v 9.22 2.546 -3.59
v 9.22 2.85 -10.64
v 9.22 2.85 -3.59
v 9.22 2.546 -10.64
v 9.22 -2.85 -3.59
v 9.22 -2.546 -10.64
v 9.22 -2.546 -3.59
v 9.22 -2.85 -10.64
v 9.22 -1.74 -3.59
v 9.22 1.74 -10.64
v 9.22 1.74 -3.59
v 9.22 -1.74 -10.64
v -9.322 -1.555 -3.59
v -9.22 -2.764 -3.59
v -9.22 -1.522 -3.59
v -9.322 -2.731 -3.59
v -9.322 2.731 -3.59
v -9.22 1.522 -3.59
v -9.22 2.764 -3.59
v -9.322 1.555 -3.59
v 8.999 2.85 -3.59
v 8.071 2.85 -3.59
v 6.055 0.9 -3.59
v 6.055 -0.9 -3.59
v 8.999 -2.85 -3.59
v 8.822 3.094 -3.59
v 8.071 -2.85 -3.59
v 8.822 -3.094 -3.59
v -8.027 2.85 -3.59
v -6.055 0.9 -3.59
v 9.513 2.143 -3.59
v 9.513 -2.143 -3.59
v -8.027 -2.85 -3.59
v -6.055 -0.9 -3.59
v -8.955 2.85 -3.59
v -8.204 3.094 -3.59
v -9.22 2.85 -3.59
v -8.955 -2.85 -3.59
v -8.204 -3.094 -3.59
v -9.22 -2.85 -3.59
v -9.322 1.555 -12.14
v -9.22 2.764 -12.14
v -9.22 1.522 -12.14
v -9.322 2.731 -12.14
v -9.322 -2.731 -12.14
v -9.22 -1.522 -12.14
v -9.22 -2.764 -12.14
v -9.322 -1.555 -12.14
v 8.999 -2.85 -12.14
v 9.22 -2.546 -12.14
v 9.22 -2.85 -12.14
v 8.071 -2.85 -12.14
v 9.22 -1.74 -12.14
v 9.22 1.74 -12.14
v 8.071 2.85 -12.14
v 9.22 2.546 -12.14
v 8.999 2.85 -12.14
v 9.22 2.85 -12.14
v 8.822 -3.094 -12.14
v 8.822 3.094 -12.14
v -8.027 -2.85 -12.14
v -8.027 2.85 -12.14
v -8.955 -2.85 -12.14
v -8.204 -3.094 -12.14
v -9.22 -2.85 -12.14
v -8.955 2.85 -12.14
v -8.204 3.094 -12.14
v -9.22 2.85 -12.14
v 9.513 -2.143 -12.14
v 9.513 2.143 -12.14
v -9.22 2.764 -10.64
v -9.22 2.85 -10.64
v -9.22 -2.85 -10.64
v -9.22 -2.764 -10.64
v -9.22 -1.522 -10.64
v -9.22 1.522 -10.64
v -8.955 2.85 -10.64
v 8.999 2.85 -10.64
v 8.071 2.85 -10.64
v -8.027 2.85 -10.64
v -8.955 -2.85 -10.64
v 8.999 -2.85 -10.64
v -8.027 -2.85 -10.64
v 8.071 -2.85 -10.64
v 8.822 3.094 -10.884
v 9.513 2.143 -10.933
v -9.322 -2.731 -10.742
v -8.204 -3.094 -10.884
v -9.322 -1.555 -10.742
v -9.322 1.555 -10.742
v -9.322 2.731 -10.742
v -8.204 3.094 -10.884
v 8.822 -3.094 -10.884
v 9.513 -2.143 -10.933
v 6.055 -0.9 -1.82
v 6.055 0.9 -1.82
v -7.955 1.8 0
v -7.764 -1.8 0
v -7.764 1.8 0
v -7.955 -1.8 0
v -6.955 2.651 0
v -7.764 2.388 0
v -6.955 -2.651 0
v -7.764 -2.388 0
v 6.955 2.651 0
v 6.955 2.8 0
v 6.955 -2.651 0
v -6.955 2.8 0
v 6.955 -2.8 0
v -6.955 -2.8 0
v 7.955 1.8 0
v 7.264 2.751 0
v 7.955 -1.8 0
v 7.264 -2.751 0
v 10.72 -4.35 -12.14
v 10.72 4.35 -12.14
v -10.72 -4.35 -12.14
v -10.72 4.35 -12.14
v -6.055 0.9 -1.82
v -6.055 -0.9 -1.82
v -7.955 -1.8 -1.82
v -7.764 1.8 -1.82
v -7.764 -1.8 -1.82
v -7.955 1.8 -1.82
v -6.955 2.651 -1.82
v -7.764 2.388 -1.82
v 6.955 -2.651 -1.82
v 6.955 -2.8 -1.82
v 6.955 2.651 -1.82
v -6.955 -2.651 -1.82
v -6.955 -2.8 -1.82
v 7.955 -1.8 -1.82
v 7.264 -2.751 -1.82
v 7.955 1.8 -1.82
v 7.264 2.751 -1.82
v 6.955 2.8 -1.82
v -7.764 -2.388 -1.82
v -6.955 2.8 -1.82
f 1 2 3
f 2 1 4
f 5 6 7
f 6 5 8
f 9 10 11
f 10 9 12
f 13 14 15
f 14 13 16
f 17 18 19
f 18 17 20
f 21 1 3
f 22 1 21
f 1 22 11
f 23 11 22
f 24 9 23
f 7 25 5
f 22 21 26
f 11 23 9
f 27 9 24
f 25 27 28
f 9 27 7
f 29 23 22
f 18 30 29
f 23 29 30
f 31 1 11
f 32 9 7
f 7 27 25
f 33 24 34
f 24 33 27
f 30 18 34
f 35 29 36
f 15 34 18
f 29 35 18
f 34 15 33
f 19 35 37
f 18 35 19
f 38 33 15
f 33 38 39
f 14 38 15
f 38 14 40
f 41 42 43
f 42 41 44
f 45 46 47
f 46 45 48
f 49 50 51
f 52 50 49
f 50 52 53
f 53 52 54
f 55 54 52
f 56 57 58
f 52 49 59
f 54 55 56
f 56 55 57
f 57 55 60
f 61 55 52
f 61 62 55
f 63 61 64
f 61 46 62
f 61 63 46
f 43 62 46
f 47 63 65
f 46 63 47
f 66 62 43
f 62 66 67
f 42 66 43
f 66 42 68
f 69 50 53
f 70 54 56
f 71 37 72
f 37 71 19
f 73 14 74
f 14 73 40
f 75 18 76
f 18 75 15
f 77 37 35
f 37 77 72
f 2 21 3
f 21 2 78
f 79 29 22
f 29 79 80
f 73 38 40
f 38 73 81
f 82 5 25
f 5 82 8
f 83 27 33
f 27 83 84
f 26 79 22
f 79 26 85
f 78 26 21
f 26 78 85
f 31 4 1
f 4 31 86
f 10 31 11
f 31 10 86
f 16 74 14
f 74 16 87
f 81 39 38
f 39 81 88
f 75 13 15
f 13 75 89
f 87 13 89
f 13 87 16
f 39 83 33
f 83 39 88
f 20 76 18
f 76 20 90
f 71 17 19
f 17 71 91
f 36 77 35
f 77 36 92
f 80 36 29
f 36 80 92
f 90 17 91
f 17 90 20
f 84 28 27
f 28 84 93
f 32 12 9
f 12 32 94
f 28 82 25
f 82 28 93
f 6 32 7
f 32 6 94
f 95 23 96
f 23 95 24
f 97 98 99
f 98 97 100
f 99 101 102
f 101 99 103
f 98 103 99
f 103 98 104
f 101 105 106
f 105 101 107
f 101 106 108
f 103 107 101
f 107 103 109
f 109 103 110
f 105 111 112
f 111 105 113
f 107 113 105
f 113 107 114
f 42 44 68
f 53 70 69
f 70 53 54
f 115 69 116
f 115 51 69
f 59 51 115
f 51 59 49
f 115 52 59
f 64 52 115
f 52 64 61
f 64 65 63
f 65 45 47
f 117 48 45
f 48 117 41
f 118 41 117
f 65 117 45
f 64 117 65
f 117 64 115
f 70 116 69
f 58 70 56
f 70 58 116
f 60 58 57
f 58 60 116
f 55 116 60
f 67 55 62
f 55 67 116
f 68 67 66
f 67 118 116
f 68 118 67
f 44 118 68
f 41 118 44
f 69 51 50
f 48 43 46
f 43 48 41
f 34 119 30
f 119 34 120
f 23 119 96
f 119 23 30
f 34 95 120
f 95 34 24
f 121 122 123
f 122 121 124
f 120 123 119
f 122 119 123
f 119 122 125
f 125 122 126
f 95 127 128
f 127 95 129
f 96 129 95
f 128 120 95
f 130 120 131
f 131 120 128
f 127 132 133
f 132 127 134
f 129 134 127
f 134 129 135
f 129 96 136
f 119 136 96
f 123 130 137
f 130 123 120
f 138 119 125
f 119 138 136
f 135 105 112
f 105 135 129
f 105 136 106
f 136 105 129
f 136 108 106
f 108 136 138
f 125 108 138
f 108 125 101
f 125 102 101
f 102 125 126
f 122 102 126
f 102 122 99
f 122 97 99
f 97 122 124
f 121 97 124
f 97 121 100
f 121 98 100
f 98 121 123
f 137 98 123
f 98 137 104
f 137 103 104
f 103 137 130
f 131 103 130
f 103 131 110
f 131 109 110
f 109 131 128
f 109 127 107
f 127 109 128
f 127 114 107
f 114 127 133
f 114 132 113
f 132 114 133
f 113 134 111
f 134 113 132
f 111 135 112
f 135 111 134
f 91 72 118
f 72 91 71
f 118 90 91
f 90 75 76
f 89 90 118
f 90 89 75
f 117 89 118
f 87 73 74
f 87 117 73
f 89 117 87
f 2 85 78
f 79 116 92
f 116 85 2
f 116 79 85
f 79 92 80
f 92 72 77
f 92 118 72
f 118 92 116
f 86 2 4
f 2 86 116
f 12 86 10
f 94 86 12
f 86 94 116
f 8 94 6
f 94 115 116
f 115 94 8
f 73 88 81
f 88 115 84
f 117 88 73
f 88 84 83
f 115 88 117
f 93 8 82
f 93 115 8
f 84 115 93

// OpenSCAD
//$fn = 20;

// produces a shape to be subtracted from a plate for the PCB card-edge passthrough
// t = plate thickness
// location = [x,y,z] top-center of 
// con_clearance = clearance between mated connector and pocket on all sides
// con_len = length of connector (samtec MECF-08-01-L-DV-NP-WT=18.34, 20pos = 33.58)
// r = tool radius
// gp_buffer = glue pocket buffer space around PCB
// pcb_t = PCB tab thickness
// pcb_len = PCB tab length
// pcb_clearance = clearance around PCB in its slot
// length for allignment fillets
module card_edge_passthrough(location, con_len=18.34, con_clearance=0.05, t=12.14, r=1, gp_buffer=2, pcb_t=1.6, pcb_len=11.91, pcb_clearance=0.1, fillet_length=1.5){
    connector_height=8.5; //mm SAMTEC MECF-XX-01-L-DV-NP-WT
    connector_width=5.60; //mm SAMTEC MECF-XX-01-L-DV-NP-WT
    
    // calculate connector pocket corner coordinates
    con_cornerA = [con_len/2+con_clearance, connector_width/2+con_clearance];
    con_cornerB = [-con_len/2-con_clearance, -connector_width/2-con_clearance];
    con_cornerC = [-con_len/2-con_clearance, connector_width/2+con_clearance];
    con_cornerD = [con_len/2+con_clearance, -connector_width/2-con_clearance];
    
    // calculate connector pocket fillet polyhedron coordinates

    fillet_corner0 = [con_cornerB[0] - fillet_length, con_cornerB[1] - fillet_length, -t];
    fillet_corner1 = [con_cornerC[0] - fillet_length, con_cornerC[1] + fillet_length, -t];
    fillet_corner2 = [con_cornerA[0] + fillet_length, con_cornerA[1] + fillet_length, -t];
    fillet_corner3 = [con_cornerD[0] + fillet_length, con_cornerD[1] - fillet_length, -t];
    fillet_corner4 = [con_cornerB[0], con_cornerB[1], -t + fillet_length];
    fillet_corner5 = [con_cornerC[0], con_cornerC[1], -t + fillet_length];
    fillet_corner6 = [con_cornerA[0], con_cornerA[1], -t + fillet_length];
    fillet_corner7 = [con_cornerD[0], con_cornerD[1], -t + fillet_length];
    
    // calculate some glue pocket parameters
    above_connector = t-connector_height; // space above the connector pocket
    gp_width = 2*gp_buffer + pcb_t; // width of glue pocket
    gp_len = 2*gp_buffer + pcb_len; // length of glue pocket
    glue_pocket_depth = above_connector/2; // depth of glue pocket
    
    union(){
        // fabricate the board slot
        translate([0,0,-t/2]) cube([pcb_len+2*pcb_clearance, pcb_t+2*pcb_clearance,t], center=true);
        
        // fabricate the rounded corner glue pocket
        translate([0,0,-glue_pocket_depth]) linear_extrude(glue_pocket_depth) difference(){// subtract away the corners to get rounds
        square([gp_len,gp_width],center=true);
        translate([gp_len/2-r,gp_width/2-r,0]) difference(){
            translate([0,0,0]) square([r,r]);
            circle(r=r);
            }
        translate([-gp_len/2+r,-gp_width/2+r,0]) difference(){
            translate([-r,-r,0]) square([r,r]);
            circle(r=r);
            }
        translate([-gp_len/2+r,gp_width/2-r,0]) difference(){
            translate([-r,0,0]) square([r,r]);
            circle(r=r);
            }
        translate([gp_len/2-r,-gp_width/2+r,0]) difference(){
            translate([0,-r,0]) square([r,r]);
            circle(r=r);
            }
        } // end difference
        
        // fabricate connector socket well with drilled corners
        translate([location[0],location[1],location[2]+(connector_height+con_clearance)/2-t]) union(){ // socket well with drilled corners
            cube([con_len+2*con_clearance,connector_width+2*con_clearance,connector_height+con_clearance],center=true);
            translate([con_cornerA[0]-r/sqrt(2),con_cornerA[1]-r/sqrt(2)]) cylinder(r=r,h=connector_height+con_clearance,center=true);
            translate([con_cornerB[0]+r/sqrt(2),con_cornerB[1]+r/sqrt(2)]) cylinder(r=r,h=connector_height+con_clearance,center=true);
            translate([con_cornerC[0]+r/sqrt(2),con_cornerC[1]-r/sqrt(2)]) cylinder(r=r,h=connector_height+con_clearance,center=true);
            translate([con_cornerD[0]-r/sqrt(2),con_cornerD[1]+r/sqrt(2)]) cylinder(r=r,h=connector_height+con_clearance,center=true);
        } // end socket well union
        
        // fabricate the fillet polyhedron
//        polyhedron(
//  points=[ fillet_corner0, fillet_corner1, fillet_corner2, fillet_corner3, // the four points at base
//           fillet_corner4  ],                                 // the apex point 
//  faces=[ [0,1,4],[1,2,4],[2,3,4],[3,0,4],              // each triangle side
//              [1,0,3],[2,1,3] ]                         // two triangles for square base
// );

//        p_faces = [ [0,1,4],[1,2,4],[2,3,4],[3,0,4],              // each triangle side
//              [1,0,3],[2,1,3] ];                         // two triangles for square base
//        polyhedron(
//  points=[ fillet_corner0, fillet_corner1, fillet_corner2, fillet_corner3, // the four points at base
//           fillet_corner4  ],                                 // the apex point 
//  faces=p_faces                       // two triangles for square base
        
        p_faces = [
  [0,1,2,3],  // bottom
  [4,5,1,0],  // front
  [7,6,5,4],  // top
  [5,6,2,1],  // right
  [6,7,3,2],  // back
  [7,4,0,3]]; // left
        polyhedron(
  points=[ fillet_corner0, fillet_corner1, fillet_corner2, fillet_corner3, // the four points at base
           fillet_corner4, fillet_corner5, fillet_corner6, fillet_corner7  ],                                 // the apex point 
  faces=p_faces                       // two triangles for square base
 );
    } // end union top level union
} // end module


card_edge_passthrough([0,0,0]);
